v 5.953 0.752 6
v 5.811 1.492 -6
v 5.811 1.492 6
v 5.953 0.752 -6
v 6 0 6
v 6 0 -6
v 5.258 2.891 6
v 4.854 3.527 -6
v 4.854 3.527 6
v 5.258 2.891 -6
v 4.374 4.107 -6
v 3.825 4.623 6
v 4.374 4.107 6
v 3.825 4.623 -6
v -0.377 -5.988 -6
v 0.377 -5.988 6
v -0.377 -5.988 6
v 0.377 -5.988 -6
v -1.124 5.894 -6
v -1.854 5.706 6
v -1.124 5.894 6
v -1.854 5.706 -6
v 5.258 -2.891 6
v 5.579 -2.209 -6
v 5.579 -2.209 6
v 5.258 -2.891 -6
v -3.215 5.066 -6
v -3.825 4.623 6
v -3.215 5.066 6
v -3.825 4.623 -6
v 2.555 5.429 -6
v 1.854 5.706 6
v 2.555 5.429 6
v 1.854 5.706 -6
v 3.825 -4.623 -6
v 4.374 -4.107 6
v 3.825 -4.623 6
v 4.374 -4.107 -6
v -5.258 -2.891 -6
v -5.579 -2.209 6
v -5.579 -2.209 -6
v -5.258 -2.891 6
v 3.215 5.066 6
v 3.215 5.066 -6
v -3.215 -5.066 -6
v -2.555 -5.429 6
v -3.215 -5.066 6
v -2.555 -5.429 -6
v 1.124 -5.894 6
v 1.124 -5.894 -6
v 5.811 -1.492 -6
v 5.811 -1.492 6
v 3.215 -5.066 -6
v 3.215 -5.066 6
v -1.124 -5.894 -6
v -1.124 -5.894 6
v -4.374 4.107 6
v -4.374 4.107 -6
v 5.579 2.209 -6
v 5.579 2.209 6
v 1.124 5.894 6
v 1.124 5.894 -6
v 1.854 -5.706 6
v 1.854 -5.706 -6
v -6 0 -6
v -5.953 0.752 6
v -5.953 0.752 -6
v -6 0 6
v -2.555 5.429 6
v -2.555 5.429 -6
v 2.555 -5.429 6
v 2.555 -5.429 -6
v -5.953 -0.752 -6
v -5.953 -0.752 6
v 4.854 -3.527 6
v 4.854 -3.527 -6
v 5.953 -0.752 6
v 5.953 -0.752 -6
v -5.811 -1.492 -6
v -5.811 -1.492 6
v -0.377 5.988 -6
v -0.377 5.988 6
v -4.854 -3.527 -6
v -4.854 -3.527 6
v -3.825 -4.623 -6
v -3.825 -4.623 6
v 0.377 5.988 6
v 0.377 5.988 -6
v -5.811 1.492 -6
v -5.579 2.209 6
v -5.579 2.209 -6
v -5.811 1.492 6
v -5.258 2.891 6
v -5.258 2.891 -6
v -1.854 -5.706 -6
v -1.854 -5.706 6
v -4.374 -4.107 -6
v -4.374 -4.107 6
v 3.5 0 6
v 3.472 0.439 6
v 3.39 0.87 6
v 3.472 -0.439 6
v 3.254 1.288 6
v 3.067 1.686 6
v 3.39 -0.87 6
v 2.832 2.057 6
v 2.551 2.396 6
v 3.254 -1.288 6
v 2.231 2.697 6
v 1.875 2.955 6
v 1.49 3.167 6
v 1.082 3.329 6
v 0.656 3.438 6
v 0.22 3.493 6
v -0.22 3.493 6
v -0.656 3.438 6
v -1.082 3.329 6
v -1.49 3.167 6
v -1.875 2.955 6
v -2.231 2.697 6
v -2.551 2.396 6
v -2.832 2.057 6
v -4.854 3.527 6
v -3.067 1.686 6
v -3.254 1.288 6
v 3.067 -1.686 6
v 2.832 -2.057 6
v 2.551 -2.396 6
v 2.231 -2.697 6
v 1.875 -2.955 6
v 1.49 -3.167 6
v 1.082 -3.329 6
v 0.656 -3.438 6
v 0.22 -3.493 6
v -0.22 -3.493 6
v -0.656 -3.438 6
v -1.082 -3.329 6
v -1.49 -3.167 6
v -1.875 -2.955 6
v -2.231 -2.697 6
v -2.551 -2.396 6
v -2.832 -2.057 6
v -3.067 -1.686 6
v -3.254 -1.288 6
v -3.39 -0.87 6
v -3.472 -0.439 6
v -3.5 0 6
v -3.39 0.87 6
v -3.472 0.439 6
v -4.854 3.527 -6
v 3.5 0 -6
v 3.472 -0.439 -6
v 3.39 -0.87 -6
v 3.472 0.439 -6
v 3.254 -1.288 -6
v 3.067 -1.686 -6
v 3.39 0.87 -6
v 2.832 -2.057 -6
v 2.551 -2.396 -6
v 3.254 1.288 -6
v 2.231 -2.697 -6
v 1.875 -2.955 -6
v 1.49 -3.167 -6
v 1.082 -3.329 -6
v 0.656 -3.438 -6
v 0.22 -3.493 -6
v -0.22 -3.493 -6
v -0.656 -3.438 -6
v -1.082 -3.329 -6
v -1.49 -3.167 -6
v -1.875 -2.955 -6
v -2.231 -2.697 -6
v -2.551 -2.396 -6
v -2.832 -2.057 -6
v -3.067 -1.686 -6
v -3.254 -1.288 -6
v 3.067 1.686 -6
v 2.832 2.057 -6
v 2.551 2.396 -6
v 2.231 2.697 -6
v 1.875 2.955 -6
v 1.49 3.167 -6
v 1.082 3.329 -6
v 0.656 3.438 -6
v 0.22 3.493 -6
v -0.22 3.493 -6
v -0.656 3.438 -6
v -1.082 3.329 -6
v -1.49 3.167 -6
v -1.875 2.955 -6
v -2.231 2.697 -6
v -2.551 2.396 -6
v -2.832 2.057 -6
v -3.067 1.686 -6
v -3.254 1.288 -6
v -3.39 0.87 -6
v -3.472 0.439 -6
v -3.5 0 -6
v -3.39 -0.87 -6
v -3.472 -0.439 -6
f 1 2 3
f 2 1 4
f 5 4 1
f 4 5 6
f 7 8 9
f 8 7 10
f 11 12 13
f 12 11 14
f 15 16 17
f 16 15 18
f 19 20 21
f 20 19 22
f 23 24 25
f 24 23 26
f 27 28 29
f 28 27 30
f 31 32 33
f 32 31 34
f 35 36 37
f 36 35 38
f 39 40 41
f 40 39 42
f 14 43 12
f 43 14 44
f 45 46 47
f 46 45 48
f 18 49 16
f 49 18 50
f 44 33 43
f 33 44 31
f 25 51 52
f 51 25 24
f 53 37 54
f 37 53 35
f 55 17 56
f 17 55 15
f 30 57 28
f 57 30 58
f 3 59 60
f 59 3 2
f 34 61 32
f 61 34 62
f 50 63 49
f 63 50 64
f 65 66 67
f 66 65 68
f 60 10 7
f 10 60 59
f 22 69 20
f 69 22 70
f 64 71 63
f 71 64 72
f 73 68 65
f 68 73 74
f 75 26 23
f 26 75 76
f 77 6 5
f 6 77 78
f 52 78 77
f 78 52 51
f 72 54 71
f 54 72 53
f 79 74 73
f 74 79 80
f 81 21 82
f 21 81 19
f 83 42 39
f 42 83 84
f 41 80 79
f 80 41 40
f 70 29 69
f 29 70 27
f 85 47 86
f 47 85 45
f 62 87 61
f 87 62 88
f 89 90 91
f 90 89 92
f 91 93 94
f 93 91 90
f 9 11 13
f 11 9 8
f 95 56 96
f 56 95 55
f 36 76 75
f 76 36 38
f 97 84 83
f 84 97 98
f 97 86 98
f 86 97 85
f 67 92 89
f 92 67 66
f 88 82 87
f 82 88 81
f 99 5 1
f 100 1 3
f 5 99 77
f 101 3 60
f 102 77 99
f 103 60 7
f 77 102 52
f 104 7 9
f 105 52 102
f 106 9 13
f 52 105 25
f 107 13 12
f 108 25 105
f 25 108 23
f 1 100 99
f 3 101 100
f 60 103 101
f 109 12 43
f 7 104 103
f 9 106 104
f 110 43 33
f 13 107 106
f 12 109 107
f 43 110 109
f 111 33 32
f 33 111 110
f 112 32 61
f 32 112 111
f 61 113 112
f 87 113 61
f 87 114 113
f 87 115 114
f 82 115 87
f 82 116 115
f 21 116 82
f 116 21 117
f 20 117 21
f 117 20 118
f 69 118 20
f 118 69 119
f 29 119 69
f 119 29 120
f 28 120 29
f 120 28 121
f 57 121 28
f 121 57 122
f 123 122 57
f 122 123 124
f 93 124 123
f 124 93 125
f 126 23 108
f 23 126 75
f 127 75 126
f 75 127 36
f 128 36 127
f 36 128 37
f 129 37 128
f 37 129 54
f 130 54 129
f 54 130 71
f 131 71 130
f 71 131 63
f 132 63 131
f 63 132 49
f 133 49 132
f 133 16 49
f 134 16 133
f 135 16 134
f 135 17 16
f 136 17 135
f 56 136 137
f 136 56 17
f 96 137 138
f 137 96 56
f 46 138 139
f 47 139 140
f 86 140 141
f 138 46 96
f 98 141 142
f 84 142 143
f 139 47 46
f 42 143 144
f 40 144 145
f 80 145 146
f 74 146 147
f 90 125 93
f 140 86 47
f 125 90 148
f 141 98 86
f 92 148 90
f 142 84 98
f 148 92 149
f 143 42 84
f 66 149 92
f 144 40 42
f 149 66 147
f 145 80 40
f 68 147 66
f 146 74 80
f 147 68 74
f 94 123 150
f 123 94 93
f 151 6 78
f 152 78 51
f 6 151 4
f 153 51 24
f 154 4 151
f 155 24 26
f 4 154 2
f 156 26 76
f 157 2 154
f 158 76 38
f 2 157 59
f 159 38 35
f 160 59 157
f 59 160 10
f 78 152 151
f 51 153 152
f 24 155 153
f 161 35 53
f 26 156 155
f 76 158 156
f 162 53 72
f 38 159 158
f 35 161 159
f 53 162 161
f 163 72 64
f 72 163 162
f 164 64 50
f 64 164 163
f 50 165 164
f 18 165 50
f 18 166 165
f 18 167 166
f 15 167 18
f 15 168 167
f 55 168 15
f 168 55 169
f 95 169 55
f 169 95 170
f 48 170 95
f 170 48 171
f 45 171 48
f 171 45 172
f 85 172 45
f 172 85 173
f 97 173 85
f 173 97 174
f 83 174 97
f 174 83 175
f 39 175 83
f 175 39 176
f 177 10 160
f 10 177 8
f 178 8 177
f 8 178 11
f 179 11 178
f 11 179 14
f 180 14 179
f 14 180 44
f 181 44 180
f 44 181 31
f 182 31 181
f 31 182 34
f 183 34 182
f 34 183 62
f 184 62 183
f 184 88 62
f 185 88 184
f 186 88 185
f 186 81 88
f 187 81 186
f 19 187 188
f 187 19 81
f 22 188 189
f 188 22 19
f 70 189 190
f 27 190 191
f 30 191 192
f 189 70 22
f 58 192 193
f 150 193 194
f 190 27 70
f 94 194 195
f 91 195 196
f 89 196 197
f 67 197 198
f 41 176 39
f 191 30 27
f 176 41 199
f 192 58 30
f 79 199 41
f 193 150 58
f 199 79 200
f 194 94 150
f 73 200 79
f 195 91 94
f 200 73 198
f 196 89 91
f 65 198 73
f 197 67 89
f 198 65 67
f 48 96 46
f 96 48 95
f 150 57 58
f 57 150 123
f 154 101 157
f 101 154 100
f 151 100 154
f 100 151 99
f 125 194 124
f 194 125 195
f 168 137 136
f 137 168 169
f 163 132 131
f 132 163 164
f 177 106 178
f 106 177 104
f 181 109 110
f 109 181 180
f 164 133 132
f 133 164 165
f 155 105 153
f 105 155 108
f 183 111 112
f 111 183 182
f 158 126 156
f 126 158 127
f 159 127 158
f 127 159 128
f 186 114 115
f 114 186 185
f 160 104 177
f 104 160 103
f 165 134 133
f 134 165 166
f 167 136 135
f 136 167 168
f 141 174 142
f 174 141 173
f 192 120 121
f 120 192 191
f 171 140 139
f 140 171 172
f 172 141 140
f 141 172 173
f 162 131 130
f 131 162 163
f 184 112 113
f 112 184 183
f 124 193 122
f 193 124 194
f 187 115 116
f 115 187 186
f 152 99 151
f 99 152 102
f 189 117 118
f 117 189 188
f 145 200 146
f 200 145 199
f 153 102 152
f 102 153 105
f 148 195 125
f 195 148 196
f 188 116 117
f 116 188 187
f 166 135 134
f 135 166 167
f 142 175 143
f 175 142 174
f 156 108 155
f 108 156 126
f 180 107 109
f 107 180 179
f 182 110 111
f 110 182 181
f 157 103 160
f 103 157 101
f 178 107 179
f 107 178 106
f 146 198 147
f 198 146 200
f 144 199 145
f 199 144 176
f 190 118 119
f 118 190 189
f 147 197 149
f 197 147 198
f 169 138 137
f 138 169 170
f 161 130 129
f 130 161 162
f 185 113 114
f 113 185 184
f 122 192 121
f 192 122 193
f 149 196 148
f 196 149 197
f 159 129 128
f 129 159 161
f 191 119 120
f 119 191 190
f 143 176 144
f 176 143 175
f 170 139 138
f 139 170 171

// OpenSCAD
$fn = 50;


difference() {
	union() {
		translate(v = [0, 0, -6.0000000000]) {
			cylinder(h = 12, r = 6.0000000000);
		}
	}
	union() {
		translate(v = [0, 0, -100.0000000000]) {
			cylinder(h = 200, r = 3.5000000000);
		}
	}
}
